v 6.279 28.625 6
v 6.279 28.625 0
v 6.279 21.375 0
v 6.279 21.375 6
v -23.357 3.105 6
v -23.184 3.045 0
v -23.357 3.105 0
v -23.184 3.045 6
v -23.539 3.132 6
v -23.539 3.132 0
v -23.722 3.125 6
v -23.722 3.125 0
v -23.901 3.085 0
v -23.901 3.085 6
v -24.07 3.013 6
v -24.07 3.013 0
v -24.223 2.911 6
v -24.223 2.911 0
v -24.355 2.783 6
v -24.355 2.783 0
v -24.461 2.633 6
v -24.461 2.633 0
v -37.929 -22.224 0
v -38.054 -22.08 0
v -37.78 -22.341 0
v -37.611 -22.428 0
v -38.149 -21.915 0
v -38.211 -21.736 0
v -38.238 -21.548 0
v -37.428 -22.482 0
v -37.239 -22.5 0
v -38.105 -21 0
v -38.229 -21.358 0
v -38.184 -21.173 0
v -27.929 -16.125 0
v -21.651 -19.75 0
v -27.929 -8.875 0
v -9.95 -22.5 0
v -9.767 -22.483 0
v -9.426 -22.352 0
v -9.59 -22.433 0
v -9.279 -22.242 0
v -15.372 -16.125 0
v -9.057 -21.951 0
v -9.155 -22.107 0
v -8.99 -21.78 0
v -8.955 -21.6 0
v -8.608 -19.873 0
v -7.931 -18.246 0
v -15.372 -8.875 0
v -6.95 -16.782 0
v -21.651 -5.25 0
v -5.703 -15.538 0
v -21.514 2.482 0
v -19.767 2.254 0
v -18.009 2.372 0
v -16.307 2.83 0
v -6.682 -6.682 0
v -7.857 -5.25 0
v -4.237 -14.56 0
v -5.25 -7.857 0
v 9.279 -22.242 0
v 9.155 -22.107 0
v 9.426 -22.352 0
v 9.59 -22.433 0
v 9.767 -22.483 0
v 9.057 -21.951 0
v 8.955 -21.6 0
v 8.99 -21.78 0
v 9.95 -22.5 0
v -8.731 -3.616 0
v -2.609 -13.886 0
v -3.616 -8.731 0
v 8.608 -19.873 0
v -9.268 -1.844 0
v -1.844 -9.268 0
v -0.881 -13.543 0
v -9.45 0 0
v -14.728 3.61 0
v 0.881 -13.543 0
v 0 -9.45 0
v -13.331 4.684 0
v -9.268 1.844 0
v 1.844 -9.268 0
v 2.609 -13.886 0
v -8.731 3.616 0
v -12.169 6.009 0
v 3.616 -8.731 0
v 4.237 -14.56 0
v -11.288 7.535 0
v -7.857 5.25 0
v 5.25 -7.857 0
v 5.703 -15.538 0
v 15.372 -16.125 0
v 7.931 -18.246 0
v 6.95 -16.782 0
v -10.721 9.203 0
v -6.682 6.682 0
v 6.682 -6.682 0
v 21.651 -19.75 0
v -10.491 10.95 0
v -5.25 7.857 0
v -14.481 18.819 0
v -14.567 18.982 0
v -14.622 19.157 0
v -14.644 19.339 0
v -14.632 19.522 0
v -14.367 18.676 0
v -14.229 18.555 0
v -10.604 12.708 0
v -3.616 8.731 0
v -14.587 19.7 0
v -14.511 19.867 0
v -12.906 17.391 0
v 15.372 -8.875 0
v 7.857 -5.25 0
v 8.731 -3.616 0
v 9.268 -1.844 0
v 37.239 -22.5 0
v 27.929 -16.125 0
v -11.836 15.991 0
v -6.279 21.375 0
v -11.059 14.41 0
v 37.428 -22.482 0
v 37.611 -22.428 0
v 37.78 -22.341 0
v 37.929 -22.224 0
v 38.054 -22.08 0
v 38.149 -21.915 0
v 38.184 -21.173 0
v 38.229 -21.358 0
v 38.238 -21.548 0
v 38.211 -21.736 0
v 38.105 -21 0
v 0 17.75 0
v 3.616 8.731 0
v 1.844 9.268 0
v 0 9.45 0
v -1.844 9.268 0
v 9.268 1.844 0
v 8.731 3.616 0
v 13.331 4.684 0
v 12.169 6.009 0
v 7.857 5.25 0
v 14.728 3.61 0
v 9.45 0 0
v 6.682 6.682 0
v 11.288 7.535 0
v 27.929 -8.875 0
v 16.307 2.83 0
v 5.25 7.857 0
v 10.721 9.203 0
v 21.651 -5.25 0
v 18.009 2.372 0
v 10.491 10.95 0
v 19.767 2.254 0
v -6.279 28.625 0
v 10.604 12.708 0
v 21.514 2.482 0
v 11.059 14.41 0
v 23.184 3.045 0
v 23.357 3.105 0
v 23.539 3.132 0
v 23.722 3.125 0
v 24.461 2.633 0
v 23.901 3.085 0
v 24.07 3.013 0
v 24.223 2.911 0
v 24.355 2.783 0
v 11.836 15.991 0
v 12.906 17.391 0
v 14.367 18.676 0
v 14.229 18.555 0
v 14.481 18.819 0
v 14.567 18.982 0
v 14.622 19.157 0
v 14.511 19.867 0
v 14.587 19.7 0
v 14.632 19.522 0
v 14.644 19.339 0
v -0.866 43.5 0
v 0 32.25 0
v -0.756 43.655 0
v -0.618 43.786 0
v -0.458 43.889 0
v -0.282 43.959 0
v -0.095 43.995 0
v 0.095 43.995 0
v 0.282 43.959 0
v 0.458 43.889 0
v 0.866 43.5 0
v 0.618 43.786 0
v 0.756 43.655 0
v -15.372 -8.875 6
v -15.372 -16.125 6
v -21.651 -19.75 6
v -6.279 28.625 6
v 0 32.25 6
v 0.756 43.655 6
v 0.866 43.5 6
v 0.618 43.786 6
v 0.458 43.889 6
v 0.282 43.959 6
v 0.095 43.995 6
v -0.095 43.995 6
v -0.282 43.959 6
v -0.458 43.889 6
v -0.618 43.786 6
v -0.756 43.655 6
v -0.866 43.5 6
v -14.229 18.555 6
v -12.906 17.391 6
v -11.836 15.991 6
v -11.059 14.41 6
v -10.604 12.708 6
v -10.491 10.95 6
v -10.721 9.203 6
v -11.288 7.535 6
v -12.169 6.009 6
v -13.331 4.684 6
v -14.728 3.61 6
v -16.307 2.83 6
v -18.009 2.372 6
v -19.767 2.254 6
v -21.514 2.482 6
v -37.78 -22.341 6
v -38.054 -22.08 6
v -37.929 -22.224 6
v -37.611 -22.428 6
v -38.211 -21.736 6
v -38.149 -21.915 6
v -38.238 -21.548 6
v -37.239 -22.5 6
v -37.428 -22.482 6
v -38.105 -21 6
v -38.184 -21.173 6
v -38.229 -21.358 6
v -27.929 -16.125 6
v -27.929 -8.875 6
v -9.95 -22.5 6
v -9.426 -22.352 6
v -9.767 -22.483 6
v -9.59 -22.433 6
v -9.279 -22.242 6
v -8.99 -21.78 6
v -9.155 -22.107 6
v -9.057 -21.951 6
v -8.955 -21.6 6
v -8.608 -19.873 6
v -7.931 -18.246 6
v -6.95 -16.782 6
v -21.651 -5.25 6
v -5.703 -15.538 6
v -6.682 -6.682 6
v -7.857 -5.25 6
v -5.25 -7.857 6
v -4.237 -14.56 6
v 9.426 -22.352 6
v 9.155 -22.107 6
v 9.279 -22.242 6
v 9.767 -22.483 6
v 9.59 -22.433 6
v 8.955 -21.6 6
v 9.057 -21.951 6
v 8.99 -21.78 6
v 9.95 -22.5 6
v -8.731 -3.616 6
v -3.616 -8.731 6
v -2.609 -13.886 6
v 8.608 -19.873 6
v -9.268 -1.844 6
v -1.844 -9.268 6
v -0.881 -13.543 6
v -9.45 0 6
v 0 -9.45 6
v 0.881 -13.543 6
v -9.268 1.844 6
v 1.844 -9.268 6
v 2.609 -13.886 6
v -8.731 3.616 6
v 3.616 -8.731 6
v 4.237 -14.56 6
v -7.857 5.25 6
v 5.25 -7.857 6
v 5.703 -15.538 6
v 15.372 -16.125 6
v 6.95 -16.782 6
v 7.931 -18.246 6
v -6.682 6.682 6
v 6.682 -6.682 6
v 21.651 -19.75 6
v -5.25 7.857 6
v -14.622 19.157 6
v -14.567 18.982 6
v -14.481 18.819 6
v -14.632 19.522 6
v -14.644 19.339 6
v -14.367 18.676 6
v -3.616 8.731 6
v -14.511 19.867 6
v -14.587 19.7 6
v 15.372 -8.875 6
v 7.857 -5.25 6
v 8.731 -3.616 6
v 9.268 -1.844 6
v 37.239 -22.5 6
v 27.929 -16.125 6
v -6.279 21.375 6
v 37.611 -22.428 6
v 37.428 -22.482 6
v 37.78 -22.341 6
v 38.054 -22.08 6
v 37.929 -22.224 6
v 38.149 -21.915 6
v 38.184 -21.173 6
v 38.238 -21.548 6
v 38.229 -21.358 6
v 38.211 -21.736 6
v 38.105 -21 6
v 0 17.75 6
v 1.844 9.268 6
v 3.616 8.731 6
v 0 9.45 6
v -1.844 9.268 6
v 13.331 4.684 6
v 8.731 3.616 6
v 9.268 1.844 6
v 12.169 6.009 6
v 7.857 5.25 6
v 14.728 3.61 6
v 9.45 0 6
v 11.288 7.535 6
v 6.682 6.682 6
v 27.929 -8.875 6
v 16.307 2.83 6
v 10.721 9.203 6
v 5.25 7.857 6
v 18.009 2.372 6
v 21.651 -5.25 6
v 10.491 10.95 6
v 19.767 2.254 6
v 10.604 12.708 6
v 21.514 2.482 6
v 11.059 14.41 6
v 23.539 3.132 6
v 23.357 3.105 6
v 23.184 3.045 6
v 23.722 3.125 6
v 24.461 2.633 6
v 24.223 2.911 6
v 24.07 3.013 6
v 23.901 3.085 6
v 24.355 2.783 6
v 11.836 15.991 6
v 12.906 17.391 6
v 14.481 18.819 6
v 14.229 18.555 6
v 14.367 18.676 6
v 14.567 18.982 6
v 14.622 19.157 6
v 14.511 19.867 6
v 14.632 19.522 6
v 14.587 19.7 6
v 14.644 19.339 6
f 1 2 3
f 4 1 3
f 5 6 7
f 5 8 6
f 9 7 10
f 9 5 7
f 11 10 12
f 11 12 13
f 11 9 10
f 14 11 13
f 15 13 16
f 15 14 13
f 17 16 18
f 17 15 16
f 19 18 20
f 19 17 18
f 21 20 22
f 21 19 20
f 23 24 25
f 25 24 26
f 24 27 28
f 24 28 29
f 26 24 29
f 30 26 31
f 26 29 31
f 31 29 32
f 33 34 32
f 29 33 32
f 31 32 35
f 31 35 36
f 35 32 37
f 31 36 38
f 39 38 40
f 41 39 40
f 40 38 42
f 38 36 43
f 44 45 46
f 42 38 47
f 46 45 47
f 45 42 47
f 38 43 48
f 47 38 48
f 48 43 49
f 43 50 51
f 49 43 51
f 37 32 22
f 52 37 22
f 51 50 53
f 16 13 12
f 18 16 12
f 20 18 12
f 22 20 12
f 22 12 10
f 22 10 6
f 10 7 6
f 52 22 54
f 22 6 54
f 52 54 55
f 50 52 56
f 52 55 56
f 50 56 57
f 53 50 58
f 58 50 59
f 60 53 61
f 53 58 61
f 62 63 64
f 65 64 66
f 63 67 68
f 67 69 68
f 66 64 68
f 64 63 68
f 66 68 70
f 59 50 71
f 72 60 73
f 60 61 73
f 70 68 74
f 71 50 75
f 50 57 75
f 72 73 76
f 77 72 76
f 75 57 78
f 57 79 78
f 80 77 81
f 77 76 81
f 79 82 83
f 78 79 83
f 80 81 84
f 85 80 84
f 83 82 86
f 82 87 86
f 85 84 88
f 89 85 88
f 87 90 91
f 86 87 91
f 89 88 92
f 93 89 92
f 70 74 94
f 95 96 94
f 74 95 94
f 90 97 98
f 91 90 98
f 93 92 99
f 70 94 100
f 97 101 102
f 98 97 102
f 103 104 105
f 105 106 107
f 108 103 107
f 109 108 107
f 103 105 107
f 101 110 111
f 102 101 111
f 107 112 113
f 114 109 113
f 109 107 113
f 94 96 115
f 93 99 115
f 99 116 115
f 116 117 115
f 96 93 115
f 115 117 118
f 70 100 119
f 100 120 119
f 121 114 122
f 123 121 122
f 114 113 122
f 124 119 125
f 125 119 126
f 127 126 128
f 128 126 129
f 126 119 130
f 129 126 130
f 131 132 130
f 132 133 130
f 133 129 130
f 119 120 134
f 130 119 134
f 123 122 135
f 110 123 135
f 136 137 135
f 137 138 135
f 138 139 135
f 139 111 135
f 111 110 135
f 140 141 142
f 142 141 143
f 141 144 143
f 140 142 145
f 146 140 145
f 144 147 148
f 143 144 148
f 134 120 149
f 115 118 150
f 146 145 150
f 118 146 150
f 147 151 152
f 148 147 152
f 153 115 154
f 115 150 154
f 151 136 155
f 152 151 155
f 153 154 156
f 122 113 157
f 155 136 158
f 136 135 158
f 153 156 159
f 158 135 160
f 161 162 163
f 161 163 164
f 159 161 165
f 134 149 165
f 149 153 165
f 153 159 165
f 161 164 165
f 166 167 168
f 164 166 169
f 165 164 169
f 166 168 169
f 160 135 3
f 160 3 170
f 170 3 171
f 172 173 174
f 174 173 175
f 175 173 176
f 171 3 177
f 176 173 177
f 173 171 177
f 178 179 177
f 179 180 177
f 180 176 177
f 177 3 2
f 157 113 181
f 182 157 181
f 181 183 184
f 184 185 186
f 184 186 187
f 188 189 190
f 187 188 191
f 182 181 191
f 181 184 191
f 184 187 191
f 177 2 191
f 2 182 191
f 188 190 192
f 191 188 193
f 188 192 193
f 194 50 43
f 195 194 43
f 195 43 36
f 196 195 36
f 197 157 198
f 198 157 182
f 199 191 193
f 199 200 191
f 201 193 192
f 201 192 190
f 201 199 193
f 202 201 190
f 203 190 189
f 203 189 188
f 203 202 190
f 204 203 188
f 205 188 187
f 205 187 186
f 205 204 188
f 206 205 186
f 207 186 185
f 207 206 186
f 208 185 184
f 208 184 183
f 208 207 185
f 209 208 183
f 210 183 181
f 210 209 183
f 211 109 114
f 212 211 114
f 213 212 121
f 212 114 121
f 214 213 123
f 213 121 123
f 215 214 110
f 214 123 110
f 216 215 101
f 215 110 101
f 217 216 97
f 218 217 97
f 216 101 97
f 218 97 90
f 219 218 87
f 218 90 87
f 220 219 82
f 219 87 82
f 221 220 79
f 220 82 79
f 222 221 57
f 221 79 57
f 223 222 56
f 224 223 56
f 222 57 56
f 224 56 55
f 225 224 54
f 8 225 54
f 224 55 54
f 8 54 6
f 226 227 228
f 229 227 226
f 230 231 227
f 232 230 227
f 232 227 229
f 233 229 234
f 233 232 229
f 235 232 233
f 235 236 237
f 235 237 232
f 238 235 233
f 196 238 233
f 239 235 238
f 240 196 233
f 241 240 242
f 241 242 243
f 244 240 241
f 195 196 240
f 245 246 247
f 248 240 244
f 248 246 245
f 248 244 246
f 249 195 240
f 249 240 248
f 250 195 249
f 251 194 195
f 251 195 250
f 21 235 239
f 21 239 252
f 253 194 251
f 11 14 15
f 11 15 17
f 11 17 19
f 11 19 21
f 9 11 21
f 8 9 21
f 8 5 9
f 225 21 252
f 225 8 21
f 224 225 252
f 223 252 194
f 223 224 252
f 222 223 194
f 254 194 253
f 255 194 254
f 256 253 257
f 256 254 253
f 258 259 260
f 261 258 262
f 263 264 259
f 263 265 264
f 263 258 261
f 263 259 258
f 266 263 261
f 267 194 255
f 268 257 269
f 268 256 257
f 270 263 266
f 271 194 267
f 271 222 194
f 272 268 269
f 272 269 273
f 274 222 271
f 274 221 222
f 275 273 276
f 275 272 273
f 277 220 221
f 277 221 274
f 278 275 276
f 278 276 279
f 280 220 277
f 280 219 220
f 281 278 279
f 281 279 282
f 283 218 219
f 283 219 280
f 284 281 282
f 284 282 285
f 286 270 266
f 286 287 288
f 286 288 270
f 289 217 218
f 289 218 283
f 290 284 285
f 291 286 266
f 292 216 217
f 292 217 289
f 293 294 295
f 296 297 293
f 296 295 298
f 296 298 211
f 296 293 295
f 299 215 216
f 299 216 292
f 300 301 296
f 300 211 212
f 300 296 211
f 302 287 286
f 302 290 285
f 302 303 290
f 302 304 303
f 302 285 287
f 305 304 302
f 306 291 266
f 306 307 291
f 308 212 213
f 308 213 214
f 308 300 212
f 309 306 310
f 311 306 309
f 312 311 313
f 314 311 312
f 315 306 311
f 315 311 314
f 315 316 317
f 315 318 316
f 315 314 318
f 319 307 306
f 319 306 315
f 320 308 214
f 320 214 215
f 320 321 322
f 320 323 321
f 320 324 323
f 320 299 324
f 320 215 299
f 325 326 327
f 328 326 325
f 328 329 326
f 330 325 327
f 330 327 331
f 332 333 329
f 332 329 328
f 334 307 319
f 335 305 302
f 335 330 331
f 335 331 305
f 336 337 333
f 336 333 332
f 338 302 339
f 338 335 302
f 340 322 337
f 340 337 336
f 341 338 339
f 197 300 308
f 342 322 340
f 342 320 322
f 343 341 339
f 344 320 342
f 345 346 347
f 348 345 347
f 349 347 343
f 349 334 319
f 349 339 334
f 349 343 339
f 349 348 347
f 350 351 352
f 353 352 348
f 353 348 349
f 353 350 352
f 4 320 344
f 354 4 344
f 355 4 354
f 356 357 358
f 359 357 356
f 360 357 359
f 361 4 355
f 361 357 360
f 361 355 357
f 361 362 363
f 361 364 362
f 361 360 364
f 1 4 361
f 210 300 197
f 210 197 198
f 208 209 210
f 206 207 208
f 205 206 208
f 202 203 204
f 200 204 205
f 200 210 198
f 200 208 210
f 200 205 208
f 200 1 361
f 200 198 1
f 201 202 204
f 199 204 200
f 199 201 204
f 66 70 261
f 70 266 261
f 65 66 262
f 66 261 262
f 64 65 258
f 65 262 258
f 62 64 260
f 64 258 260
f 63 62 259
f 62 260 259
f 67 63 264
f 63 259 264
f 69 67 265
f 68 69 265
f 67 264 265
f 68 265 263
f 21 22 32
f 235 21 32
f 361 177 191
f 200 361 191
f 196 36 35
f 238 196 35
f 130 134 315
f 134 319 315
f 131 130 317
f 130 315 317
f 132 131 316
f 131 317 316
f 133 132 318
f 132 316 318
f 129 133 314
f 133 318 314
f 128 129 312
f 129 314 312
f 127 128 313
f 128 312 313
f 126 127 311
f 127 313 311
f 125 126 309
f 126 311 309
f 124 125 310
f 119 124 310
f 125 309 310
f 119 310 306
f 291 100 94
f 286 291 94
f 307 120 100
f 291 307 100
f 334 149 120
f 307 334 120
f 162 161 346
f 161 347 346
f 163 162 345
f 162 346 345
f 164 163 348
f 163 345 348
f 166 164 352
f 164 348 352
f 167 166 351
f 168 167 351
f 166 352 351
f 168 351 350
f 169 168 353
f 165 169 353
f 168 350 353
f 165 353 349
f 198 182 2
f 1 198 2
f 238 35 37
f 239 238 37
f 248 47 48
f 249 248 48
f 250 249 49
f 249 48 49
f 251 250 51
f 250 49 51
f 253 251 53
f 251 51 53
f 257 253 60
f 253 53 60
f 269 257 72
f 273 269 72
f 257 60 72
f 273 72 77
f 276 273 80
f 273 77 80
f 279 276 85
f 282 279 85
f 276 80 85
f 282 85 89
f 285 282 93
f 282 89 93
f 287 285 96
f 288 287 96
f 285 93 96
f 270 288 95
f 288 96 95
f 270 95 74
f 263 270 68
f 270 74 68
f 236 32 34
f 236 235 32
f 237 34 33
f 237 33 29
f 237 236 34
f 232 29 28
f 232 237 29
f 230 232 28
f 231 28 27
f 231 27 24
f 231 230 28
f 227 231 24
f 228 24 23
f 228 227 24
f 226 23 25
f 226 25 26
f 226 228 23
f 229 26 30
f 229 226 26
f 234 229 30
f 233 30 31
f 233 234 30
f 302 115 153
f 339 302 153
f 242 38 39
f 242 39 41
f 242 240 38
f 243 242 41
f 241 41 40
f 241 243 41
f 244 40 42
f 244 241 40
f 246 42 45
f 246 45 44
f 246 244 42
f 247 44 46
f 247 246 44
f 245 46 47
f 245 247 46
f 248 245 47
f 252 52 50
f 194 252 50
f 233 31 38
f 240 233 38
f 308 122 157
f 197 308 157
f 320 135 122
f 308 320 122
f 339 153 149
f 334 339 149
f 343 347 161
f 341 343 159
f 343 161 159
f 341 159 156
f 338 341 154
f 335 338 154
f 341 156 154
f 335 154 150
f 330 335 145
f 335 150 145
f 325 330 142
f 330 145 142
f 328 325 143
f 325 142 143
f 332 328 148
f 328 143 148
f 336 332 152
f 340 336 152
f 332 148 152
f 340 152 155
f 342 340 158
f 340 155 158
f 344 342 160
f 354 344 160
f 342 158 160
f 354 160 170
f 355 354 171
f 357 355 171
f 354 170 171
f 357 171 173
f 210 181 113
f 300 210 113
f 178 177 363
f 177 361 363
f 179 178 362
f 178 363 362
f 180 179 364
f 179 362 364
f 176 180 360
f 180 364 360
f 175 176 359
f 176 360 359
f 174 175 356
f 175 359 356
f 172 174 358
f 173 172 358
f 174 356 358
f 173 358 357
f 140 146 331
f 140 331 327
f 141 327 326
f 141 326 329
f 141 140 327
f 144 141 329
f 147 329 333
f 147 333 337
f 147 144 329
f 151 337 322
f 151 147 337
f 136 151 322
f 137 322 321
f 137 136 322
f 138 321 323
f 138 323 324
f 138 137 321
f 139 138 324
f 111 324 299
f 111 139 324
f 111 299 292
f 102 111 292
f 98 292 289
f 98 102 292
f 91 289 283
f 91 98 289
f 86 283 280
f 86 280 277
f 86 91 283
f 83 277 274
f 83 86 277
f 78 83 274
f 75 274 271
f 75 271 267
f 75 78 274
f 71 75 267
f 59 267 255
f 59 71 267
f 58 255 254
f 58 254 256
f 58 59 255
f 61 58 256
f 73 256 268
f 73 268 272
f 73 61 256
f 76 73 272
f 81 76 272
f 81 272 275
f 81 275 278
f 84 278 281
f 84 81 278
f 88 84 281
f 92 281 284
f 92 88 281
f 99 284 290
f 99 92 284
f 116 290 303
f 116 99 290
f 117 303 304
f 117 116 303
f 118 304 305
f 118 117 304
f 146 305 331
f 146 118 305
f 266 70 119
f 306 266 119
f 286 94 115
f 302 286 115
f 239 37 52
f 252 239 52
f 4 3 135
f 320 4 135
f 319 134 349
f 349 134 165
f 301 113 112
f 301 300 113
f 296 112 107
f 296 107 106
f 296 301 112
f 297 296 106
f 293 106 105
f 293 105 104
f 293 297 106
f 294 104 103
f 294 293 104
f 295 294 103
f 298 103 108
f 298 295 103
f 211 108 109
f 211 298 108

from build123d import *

# Parameters (mm, degrees)
F0_R     = 9.45
F1_DEPTH = 6
F2_R     = 1
F3_R     = 1


with BuildPart() as f1:
    # F0 (on Top) → F1 (new body)
    with BuildSketch(Plane.XY):
        with BuildLine():
            Line((14.9855715851, 19.0442286341), (0, 45))
            Line((0, 45), (-14.9855715851, 19.0442286341))
            ThreePointArc((-14.9855715851, 19.0442286341), (-11.6913429511, 6.75), (-23.9855715851, 3.4557713659))
            Line((-23.9855715851, 3.4557713659), (-38.9711431703, -22.5))
            Line((-38.9711431703, -22.5), (-9, -22.5))
            ThreePointArc((-9, -22.5), (0, -13.5), (9, -22.5))
            Line((9, -22.5), (38.9711431703, -22.5))
            Line((38.9711431703, -22.5), (23.9855715851, 3.4557713659))
            ThreePointArc((23.9855715851, 3.4557713659), (11.6913429511, 6.75), (14.9855715851, 19.0442286341))
        make_face()
        Polygon((-15.3719509172, -16.125), (-21.6506350946, -19.75), (-27.929319272, -16.125), (-27.929319272, -8.875), (-21.6506350946, -5.25), (-15.3719509172, -8.875), align=None, mode=Mode.SUBTRACT)
        Polygon((21.6506350946, -5.25), (27.929319272, -8.875), (27.929319272, -16.125), (21.6506350946, -19.75), (15.3719509172, -16.125), (15.3719509172, -8.875), align=None, mode=Mode.SUBTRACT)
        Circle(F0_R, mode=Mode.SUBTRACT)
        Polygon((-6.2786841774, 28.625), (0, 32.25), (6.2786841774, 28.625), (6.2786841774, 21.375), (0, 17.75), (-6.2786841774, 21.375), align=None, mode=Mode.SUBTRACT)
    extrude(amount=F1_DEPTH)

    # F2
    f2_edges = [f1.edges().sort_by_distance(p)[0] for p in [
        (14.985572, 19.044229, 3),
        (-23.985572, 3.455771, 3),
        (9, -22.5, 3),
    ]]
    fillet(f2_edges, radius=F2_R)

    # F3
    f3_edges = [f1.edges().sort_by_distance(p)[0] for p in [
        (0, 45, 3),
        (38.971143, -22.5, 3),
        (-38.971143, -22.5, 3),
        (-14.985572, 19.044229, 3),
        (23.985572, 3.455771, 3),
        (-9, -22.5, 3),
    ]]
    fillet(f3_edges, radius=F3_R)


solid = f1.part
